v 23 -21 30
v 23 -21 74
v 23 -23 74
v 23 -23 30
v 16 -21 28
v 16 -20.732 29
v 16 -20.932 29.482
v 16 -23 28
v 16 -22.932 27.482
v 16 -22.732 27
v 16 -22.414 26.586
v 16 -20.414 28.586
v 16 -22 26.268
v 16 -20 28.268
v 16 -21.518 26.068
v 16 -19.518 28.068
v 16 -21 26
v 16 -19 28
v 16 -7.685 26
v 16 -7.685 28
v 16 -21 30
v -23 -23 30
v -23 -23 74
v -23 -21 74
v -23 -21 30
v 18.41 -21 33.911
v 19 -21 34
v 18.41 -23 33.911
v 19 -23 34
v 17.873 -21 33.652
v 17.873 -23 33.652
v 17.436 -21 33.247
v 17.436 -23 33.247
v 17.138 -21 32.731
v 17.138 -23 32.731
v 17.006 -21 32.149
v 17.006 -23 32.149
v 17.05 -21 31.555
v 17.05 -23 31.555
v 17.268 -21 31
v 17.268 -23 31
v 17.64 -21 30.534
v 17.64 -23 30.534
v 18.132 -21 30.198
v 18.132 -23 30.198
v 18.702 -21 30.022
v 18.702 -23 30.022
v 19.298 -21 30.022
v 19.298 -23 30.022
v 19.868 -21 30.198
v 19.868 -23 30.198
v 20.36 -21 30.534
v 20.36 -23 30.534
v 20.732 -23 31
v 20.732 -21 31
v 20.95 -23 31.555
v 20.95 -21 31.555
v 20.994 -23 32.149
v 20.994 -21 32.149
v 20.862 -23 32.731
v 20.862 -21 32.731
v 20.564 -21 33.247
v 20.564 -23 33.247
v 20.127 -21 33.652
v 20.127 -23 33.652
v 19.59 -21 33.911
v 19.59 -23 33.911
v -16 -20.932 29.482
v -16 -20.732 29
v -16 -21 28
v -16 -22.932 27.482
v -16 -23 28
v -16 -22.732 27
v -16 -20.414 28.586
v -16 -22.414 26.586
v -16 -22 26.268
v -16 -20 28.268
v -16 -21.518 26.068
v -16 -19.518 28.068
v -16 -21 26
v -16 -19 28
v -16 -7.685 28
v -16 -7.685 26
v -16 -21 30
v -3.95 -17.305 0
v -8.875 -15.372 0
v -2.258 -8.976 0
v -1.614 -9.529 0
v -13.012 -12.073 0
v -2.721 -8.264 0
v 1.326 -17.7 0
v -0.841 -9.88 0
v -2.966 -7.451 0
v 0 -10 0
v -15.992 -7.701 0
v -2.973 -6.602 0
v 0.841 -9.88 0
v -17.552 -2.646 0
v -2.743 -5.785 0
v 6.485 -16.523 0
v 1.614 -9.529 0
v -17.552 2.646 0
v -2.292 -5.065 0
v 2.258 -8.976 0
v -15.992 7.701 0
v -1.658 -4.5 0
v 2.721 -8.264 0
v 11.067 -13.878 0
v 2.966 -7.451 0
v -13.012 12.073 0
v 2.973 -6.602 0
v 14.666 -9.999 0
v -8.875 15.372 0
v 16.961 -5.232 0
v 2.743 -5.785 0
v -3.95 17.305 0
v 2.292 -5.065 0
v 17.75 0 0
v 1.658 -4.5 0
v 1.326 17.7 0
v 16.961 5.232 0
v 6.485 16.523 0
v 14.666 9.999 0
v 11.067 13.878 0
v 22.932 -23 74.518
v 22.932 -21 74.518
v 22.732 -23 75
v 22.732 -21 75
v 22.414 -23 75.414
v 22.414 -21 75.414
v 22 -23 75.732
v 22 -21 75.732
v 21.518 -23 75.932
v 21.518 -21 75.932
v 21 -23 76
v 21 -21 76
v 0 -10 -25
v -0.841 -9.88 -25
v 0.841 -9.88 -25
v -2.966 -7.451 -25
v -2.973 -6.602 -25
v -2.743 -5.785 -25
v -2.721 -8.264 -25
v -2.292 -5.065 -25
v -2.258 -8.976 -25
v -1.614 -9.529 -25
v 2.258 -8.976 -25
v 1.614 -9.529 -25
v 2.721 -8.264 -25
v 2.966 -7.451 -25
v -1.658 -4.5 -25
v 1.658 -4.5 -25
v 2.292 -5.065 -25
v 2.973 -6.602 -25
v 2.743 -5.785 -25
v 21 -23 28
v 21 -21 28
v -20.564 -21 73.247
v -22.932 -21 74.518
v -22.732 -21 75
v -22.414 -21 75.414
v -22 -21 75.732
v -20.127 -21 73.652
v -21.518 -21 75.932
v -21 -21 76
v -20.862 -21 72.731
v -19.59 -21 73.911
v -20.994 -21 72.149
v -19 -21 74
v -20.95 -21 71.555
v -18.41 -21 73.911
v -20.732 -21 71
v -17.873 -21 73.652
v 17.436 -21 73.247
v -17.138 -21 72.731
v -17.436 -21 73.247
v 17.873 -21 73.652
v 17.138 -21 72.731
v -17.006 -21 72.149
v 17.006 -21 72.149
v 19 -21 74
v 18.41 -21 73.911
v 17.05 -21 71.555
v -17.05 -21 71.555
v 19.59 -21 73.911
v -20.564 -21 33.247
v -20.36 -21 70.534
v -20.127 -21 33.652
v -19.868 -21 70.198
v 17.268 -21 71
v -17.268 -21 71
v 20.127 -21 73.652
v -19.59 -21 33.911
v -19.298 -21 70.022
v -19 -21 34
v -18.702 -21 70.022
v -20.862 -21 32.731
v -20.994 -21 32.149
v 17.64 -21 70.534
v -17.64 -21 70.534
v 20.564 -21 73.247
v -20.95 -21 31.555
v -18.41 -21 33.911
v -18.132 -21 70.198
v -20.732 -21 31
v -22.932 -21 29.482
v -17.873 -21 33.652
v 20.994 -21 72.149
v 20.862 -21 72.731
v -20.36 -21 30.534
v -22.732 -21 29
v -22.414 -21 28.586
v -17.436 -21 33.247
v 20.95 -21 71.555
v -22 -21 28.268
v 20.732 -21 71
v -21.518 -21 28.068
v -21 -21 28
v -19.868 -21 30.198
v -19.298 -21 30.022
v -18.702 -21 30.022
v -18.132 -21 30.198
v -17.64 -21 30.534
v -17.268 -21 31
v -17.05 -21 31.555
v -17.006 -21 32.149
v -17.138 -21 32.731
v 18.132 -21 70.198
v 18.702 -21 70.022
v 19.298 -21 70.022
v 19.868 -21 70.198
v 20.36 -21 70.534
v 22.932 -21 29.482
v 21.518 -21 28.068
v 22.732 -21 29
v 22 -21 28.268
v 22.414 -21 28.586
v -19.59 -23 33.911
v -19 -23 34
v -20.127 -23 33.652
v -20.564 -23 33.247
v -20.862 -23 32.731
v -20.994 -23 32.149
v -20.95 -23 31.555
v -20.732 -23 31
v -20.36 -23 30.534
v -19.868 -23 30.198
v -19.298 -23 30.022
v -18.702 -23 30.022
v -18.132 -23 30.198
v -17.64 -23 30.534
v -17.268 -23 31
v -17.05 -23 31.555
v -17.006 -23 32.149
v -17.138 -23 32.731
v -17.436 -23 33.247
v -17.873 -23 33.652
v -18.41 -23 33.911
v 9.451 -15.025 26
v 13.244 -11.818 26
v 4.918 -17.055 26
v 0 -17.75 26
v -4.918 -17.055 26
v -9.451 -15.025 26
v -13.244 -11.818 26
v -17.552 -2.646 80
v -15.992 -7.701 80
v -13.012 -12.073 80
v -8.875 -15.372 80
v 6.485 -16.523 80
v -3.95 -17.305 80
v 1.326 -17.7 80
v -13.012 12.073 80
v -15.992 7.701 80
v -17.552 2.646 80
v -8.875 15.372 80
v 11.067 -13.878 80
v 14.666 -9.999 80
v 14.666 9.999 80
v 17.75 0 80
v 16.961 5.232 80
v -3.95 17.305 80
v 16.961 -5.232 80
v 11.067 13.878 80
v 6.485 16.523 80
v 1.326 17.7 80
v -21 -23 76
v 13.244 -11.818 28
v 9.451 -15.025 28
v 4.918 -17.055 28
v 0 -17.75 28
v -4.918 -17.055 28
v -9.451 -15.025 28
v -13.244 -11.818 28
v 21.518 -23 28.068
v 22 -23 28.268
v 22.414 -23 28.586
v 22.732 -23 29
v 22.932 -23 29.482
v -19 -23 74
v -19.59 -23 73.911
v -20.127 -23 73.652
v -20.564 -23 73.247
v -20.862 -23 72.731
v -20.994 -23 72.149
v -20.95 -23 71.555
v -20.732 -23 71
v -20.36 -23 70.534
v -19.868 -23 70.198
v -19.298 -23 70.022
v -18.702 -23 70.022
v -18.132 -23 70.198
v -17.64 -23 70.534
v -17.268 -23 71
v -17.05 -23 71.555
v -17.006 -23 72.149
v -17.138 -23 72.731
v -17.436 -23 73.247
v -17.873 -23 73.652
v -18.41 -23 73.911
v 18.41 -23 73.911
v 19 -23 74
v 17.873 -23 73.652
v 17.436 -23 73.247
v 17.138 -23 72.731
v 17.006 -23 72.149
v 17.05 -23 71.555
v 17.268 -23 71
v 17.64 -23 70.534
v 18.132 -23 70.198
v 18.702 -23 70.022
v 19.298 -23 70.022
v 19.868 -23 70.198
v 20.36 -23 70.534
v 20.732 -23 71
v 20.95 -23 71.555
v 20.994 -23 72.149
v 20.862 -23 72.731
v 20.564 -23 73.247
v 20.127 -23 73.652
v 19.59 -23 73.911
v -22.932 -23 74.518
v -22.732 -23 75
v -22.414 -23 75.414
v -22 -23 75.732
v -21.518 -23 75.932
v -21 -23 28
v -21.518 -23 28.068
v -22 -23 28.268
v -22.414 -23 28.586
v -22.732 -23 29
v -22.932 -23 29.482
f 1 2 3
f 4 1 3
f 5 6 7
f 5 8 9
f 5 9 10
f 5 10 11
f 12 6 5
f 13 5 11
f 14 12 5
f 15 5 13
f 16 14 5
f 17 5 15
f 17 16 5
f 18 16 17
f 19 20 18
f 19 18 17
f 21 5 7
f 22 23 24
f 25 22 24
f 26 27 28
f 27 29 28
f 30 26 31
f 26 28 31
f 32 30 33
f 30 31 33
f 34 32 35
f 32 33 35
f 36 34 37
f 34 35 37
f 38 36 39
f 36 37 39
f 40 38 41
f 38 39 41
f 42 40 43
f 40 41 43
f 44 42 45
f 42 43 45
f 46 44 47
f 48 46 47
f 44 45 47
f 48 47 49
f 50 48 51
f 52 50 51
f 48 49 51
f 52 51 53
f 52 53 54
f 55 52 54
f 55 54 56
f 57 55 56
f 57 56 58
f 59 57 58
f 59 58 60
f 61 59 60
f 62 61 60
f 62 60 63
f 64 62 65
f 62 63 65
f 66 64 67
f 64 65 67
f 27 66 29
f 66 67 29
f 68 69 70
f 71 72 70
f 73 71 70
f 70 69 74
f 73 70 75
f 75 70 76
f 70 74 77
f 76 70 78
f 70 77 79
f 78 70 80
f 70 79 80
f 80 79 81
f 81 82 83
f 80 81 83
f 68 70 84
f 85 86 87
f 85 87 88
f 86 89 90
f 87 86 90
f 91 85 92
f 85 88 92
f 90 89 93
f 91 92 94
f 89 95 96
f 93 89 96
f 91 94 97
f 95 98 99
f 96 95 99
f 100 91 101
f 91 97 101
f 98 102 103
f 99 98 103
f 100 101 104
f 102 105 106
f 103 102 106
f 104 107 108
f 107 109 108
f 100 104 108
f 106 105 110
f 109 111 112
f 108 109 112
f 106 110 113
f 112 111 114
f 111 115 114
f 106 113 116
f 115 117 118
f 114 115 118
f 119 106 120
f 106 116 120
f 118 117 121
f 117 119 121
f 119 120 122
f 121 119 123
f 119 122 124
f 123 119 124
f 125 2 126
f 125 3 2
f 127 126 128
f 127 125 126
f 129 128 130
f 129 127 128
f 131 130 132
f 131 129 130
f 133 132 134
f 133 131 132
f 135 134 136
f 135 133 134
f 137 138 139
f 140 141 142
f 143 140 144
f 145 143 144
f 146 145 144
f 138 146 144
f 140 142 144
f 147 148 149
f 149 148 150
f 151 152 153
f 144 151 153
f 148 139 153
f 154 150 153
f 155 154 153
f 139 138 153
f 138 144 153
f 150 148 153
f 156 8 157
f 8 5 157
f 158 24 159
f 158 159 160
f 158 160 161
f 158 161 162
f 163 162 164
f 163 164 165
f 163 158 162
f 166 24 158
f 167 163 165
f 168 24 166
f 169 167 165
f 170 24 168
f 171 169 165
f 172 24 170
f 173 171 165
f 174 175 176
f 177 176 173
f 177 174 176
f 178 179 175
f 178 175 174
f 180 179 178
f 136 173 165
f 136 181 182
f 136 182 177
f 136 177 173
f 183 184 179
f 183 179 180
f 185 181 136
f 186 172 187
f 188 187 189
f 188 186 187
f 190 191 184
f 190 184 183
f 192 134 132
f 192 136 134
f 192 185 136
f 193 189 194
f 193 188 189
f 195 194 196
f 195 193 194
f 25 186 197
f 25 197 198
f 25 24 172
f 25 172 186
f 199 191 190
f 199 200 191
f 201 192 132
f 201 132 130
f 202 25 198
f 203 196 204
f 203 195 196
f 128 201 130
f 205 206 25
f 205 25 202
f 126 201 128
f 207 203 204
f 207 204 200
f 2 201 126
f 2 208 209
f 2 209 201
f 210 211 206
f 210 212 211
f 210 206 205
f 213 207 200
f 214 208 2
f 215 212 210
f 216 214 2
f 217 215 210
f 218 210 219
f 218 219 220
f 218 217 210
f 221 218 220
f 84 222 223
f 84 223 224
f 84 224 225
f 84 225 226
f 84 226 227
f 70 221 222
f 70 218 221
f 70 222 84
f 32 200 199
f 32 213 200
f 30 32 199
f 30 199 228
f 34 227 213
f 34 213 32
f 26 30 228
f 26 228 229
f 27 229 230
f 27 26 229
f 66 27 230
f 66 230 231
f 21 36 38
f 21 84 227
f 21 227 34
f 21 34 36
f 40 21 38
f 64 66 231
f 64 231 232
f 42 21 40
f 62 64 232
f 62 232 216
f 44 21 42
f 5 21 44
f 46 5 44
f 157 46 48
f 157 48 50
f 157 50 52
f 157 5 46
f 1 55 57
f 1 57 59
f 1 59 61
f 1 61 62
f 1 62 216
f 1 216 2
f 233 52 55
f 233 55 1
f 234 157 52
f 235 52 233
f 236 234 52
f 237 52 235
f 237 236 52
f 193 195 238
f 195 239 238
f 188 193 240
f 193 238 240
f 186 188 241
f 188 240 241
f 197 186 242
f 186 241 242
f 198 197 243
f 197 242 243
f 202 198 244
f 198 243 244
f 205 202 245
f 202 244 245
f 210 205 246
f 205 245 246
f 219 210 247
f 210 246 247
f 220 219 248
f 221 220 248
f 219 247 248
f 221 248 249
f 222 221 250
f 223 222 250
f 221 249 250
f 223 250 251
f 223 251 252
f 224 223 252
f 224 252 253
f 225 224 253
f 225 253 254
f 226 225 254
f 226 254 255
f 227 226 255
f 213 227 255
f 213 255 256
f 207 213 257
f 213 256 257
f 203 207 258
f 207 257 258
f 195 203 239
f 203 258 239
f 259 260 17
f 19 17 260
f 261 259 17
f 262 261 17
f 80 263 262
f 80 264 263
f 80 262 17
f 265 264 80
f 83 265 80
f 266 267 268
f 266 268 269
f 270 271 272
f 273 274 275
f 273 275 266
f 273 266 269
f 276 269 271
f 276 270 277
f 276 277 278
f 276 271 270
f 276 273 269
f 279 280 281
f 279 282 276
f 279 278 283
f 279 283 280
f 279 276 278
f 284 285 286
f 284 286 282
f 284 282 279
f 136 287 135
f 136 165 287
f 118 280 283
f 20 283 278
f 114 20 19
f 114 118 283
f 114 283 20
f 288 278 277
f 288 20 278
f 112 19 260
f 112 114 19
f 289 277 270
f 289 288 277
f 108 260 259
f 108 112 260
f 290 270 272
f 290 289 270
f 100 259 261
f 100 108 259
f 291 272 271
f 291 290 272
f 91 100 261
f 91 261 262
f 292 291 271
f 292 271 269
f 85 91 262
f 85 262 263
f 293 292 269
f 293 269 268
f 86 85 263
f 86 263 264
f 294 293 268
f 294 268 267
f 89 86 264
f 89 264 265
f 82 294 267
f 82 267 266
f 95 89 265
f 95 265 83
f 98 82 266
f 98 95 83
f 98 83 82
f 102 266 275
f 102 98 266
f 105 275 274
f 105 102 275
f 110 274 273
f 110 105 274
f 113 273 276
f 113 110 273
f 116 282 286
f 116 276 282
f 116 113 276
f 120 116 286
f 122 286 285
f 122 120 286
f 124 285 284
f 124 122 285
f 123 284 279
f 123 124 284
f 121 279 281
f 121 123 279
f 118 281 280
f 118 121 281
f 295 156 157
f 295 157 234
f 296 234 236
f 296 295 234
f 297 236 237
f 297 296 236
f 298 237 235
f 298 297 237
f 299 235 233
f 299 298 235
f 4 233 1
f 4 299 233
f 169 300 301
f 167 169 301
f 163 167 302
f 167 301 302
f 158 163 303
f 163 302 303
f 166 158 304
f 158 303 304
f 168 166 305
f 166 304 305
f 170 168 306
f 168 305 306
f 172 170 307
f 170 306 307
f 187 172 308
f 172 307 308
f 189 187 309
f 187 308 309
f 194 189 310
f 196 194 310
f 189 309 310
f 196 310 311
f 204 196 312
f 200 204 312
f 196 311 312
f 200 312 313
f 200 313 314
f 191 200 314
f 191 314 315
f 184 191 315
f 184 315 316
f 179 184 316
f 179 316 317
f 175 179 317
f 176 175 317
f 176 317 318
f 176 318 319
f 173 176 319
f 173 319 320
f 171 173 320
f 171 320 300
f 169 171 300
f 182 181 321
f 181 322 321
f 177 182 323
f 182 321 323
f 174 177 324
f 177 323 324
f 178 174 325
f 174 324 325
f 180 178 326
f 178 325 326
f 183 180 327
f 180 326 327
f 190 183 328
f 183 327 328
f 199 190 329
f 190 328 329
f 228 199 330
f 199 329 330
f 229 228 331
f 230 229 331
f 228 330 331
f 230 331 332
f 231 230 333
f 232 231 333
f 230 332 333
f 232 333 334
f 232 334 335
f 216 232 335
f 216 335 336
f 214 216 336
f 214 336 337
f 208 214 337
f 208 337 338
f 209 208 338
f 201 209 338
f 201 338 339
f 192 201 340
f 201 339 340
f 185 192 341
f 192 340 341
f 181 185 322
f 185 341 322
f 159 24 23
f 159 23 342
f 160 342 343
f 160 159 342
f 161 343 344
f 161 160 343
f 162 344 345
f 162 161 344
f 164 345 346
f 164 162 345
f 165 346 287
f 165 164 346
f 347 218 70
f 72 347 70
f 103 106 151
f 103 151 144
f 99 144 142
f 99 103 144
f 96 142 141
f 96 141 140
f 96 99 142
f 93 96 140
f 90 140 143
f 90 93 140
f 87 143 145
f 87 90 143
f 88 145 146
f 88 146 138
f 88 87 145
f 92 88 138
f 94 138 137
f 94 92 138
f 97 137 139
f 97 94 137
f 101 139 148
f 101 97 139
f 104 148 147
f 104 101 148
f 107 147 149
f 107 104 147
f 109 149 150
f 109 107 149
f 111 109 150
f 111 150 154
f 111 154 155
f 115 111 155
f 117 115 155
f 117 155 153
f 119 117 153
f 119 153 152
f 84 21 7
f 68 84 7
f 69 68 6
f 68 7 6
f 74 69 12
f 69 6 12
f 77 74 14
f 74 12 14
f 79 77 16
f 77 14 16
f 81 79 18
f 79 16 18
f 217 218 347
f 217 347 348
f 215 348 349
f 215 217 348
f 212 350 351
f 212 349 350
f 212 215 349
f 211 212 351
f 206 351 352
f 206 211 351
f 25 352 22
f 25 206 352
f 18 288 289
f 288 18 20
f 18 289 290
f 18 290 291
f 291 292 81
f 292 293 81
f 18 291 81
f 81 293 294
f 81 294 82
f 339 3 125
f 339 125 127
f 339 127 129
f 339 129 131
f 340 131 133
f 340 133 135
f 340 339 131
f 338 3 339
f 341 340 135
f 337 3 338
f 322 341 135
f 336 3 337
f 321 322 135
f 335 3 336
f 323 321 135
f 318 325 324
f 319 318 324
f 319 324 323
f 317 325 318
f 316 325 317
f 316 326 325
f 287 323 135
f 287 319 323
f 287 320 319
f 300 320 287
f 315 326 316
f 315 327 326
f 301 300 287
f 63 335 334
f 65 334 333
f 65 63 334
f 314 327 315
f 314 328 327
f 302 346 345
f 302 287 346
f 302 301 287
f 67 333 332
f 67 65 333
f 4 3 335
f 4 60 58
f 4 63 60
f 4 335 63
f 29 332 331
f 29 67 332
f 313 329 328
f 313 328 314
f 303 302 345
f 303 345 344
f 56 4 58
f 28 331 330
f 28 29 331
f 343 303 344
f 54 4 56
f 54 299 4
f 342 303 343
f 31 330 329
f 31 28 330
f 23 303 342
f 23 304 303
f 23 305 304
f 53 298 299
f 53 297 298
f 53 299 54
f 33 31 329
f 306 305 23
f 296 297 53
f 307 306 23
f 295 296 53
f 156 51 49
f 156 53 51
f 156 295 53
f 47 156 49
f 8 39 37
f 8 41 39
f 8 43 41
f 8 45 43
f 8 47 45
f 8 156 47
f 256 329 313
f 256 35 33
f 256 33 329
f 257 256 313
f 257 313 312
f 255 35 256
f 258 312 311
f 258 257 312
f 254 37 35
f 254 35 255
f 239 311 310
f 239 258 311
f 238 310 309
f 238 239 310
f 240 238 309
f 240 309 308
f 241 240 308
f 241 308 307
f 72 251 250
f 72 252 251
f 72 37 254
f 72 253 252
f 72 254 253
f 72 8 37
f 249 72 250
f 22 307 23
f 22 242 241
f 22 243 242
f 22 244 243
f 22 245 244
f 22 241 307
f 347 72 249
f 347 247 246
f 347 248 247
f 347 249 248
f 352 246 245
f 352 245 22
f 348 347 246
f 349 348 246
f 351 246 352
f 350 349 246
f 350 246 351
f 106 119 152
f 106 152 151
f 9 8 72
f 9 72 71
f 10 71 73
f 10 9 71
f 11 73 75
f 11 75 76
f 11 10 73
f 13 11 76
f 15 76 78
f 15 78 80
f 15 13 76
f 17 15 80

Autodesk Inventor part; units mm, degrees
ref_plane "YZ Plane" through (0, 0, 0) normal (1, 0, 0) x (0, 1, 0)
ref_plane "XZ Plane" through (0, 0, 0) normal (0, 1, 0) x (-1, 0, 0)
sketch "Esquisse1" plane through (0, 0, 0) normal (0, 0, 1) x (1, 0, 0)
  arc A0 (-1.6583, -4.5) -> (1.6583, -4.5) centre (0, -7) ccw
  line L0 (1.6583, -4.5) -> (-1.6583, -4.5)
  point P0 (0, 0)
  dimension "d2" = 6
  dimension "d4" = 7
  dimension "d11" = 0.5
extrude "Extrusion1" add sketch "Esquisse1" against normal blind 25
sketch "Esquisse2" plane through (0, -7, 0) normal (0, 0, 1) x (1, 0, 0)
  circle A0 centre (0, 7) radius 17.75
  dimension "d8" = 35.5
extrude "Extrusion2" add sketch "Esquisse2" along normal blind 80
ref_plane "Plan de construction1" through (0, 0, 26) normal (0, 0, -1) x (-1, 0, 0)
sketch "Esquisse3" plane through (0, 0, 26) normal (0, 0, -1) x (-1, 0, 0)
  circle A0 centre (0, 0) radius 17.75 projected
  line L0 (1.6583, -4.5) -> (-1.6583, -4.5) projected
  arc A1 (-1.6583, -4.5) -> (1.6583, -4.5) centre (0, -7) ccw projected
  line L1 (-16, -7.6852) -> (-16, -21)
  line L2 (-16, -21) -> (0, -21)
  line L3 (16, -7.6852) -> (16, -21)
  line L4 (16, -21) -> (0, -21)
  arc A2 (-16, -7.6852) -> (16, -7.6852) centre (0, 0) ccw
  circle A3 centre (0, 0) radius 17.75 projected
  line L5 (-3, -7) -> (0, -7)
  line L6 (0, -4.5) -> (0, -7)
  dimension "d14" = 16
extrude "Extrusion3" add sketch "Esquisse3" against normal blind 2 contours A0 L3 L4 L2 L1
sketch "Esquisse4" plane through (0, 0, 28) normal (0, 0, 1) x (1, 0, 0)
  line L0 (-23, -21) -> (23, -21)
  line L1 (23, -21) -> (23, -23)
  line L2 (23, -23) -> (-23, -23)
  line L3 (-23, -23) -> (-23, -21)
  point P0 (0, 0)
  dimension "d18" = 2
  dimension "d19" = 46
extrude "Extrusion4" add sketch "Esquisse4" along normal blind 48
fillet "Congé1" radius 2 4 edges at (-23, -22, 28) (-23, -22, 76) (23, -22, 76) (23, -22, 28)
sketch "Esquisse5" plane through (16, -21, 26) normal (1, 0, 0) x (0, 0, -1)
  arc A0 (-2, -2) -> (0, 0) centre (-2, 0) ccw
  line L0 (-2, 0) -> (-2, -2)
  line L1 (-2, -2) -> (-2, 0) projected
  line L2 (-2, 0) -> (0, 0)
  line L3 (0, 0) -> (-2, 0) projected
  point P0 (26, 21)
extrude "Extrusion5" add sketch "Esquisse5" against normal blind 32
fillet "Congé2" radius 2 1 edges at (0, -21, 28)
sketch "Esquisse6" plane through (-21, -21, 28) normal (0, 1, 0) x (1, 0, 0)
  line L0 (40, -4) -> (2, -4)
  line L1 (2, -4) -> (2, -44)
  line L2 (2, -44) -> (40, -44)
  line L3 (40, -44) -> (40, -4)
  line L4 (44, -2) -> (44, -46) projected
  line L5 (42, 0) -> (37, 0) projected
  line L6 (42, -48) -> (0, -48) projected
  line L7 (-2, -2) -> (-2, -46) projected
  point P0 (21, 28)
  dimension "d28" = 4
  dimension "d29" = 4
  dimension "d30" = 4
  dimension "d31" = 4
hole "Perçage1" at (-19, -21, 32) at (-19, -21, 72) at (19, -21, 72) at (19, -21, 32) direction (0, -1, 0) diameter 4 end through all
properties part number "Moteur"
